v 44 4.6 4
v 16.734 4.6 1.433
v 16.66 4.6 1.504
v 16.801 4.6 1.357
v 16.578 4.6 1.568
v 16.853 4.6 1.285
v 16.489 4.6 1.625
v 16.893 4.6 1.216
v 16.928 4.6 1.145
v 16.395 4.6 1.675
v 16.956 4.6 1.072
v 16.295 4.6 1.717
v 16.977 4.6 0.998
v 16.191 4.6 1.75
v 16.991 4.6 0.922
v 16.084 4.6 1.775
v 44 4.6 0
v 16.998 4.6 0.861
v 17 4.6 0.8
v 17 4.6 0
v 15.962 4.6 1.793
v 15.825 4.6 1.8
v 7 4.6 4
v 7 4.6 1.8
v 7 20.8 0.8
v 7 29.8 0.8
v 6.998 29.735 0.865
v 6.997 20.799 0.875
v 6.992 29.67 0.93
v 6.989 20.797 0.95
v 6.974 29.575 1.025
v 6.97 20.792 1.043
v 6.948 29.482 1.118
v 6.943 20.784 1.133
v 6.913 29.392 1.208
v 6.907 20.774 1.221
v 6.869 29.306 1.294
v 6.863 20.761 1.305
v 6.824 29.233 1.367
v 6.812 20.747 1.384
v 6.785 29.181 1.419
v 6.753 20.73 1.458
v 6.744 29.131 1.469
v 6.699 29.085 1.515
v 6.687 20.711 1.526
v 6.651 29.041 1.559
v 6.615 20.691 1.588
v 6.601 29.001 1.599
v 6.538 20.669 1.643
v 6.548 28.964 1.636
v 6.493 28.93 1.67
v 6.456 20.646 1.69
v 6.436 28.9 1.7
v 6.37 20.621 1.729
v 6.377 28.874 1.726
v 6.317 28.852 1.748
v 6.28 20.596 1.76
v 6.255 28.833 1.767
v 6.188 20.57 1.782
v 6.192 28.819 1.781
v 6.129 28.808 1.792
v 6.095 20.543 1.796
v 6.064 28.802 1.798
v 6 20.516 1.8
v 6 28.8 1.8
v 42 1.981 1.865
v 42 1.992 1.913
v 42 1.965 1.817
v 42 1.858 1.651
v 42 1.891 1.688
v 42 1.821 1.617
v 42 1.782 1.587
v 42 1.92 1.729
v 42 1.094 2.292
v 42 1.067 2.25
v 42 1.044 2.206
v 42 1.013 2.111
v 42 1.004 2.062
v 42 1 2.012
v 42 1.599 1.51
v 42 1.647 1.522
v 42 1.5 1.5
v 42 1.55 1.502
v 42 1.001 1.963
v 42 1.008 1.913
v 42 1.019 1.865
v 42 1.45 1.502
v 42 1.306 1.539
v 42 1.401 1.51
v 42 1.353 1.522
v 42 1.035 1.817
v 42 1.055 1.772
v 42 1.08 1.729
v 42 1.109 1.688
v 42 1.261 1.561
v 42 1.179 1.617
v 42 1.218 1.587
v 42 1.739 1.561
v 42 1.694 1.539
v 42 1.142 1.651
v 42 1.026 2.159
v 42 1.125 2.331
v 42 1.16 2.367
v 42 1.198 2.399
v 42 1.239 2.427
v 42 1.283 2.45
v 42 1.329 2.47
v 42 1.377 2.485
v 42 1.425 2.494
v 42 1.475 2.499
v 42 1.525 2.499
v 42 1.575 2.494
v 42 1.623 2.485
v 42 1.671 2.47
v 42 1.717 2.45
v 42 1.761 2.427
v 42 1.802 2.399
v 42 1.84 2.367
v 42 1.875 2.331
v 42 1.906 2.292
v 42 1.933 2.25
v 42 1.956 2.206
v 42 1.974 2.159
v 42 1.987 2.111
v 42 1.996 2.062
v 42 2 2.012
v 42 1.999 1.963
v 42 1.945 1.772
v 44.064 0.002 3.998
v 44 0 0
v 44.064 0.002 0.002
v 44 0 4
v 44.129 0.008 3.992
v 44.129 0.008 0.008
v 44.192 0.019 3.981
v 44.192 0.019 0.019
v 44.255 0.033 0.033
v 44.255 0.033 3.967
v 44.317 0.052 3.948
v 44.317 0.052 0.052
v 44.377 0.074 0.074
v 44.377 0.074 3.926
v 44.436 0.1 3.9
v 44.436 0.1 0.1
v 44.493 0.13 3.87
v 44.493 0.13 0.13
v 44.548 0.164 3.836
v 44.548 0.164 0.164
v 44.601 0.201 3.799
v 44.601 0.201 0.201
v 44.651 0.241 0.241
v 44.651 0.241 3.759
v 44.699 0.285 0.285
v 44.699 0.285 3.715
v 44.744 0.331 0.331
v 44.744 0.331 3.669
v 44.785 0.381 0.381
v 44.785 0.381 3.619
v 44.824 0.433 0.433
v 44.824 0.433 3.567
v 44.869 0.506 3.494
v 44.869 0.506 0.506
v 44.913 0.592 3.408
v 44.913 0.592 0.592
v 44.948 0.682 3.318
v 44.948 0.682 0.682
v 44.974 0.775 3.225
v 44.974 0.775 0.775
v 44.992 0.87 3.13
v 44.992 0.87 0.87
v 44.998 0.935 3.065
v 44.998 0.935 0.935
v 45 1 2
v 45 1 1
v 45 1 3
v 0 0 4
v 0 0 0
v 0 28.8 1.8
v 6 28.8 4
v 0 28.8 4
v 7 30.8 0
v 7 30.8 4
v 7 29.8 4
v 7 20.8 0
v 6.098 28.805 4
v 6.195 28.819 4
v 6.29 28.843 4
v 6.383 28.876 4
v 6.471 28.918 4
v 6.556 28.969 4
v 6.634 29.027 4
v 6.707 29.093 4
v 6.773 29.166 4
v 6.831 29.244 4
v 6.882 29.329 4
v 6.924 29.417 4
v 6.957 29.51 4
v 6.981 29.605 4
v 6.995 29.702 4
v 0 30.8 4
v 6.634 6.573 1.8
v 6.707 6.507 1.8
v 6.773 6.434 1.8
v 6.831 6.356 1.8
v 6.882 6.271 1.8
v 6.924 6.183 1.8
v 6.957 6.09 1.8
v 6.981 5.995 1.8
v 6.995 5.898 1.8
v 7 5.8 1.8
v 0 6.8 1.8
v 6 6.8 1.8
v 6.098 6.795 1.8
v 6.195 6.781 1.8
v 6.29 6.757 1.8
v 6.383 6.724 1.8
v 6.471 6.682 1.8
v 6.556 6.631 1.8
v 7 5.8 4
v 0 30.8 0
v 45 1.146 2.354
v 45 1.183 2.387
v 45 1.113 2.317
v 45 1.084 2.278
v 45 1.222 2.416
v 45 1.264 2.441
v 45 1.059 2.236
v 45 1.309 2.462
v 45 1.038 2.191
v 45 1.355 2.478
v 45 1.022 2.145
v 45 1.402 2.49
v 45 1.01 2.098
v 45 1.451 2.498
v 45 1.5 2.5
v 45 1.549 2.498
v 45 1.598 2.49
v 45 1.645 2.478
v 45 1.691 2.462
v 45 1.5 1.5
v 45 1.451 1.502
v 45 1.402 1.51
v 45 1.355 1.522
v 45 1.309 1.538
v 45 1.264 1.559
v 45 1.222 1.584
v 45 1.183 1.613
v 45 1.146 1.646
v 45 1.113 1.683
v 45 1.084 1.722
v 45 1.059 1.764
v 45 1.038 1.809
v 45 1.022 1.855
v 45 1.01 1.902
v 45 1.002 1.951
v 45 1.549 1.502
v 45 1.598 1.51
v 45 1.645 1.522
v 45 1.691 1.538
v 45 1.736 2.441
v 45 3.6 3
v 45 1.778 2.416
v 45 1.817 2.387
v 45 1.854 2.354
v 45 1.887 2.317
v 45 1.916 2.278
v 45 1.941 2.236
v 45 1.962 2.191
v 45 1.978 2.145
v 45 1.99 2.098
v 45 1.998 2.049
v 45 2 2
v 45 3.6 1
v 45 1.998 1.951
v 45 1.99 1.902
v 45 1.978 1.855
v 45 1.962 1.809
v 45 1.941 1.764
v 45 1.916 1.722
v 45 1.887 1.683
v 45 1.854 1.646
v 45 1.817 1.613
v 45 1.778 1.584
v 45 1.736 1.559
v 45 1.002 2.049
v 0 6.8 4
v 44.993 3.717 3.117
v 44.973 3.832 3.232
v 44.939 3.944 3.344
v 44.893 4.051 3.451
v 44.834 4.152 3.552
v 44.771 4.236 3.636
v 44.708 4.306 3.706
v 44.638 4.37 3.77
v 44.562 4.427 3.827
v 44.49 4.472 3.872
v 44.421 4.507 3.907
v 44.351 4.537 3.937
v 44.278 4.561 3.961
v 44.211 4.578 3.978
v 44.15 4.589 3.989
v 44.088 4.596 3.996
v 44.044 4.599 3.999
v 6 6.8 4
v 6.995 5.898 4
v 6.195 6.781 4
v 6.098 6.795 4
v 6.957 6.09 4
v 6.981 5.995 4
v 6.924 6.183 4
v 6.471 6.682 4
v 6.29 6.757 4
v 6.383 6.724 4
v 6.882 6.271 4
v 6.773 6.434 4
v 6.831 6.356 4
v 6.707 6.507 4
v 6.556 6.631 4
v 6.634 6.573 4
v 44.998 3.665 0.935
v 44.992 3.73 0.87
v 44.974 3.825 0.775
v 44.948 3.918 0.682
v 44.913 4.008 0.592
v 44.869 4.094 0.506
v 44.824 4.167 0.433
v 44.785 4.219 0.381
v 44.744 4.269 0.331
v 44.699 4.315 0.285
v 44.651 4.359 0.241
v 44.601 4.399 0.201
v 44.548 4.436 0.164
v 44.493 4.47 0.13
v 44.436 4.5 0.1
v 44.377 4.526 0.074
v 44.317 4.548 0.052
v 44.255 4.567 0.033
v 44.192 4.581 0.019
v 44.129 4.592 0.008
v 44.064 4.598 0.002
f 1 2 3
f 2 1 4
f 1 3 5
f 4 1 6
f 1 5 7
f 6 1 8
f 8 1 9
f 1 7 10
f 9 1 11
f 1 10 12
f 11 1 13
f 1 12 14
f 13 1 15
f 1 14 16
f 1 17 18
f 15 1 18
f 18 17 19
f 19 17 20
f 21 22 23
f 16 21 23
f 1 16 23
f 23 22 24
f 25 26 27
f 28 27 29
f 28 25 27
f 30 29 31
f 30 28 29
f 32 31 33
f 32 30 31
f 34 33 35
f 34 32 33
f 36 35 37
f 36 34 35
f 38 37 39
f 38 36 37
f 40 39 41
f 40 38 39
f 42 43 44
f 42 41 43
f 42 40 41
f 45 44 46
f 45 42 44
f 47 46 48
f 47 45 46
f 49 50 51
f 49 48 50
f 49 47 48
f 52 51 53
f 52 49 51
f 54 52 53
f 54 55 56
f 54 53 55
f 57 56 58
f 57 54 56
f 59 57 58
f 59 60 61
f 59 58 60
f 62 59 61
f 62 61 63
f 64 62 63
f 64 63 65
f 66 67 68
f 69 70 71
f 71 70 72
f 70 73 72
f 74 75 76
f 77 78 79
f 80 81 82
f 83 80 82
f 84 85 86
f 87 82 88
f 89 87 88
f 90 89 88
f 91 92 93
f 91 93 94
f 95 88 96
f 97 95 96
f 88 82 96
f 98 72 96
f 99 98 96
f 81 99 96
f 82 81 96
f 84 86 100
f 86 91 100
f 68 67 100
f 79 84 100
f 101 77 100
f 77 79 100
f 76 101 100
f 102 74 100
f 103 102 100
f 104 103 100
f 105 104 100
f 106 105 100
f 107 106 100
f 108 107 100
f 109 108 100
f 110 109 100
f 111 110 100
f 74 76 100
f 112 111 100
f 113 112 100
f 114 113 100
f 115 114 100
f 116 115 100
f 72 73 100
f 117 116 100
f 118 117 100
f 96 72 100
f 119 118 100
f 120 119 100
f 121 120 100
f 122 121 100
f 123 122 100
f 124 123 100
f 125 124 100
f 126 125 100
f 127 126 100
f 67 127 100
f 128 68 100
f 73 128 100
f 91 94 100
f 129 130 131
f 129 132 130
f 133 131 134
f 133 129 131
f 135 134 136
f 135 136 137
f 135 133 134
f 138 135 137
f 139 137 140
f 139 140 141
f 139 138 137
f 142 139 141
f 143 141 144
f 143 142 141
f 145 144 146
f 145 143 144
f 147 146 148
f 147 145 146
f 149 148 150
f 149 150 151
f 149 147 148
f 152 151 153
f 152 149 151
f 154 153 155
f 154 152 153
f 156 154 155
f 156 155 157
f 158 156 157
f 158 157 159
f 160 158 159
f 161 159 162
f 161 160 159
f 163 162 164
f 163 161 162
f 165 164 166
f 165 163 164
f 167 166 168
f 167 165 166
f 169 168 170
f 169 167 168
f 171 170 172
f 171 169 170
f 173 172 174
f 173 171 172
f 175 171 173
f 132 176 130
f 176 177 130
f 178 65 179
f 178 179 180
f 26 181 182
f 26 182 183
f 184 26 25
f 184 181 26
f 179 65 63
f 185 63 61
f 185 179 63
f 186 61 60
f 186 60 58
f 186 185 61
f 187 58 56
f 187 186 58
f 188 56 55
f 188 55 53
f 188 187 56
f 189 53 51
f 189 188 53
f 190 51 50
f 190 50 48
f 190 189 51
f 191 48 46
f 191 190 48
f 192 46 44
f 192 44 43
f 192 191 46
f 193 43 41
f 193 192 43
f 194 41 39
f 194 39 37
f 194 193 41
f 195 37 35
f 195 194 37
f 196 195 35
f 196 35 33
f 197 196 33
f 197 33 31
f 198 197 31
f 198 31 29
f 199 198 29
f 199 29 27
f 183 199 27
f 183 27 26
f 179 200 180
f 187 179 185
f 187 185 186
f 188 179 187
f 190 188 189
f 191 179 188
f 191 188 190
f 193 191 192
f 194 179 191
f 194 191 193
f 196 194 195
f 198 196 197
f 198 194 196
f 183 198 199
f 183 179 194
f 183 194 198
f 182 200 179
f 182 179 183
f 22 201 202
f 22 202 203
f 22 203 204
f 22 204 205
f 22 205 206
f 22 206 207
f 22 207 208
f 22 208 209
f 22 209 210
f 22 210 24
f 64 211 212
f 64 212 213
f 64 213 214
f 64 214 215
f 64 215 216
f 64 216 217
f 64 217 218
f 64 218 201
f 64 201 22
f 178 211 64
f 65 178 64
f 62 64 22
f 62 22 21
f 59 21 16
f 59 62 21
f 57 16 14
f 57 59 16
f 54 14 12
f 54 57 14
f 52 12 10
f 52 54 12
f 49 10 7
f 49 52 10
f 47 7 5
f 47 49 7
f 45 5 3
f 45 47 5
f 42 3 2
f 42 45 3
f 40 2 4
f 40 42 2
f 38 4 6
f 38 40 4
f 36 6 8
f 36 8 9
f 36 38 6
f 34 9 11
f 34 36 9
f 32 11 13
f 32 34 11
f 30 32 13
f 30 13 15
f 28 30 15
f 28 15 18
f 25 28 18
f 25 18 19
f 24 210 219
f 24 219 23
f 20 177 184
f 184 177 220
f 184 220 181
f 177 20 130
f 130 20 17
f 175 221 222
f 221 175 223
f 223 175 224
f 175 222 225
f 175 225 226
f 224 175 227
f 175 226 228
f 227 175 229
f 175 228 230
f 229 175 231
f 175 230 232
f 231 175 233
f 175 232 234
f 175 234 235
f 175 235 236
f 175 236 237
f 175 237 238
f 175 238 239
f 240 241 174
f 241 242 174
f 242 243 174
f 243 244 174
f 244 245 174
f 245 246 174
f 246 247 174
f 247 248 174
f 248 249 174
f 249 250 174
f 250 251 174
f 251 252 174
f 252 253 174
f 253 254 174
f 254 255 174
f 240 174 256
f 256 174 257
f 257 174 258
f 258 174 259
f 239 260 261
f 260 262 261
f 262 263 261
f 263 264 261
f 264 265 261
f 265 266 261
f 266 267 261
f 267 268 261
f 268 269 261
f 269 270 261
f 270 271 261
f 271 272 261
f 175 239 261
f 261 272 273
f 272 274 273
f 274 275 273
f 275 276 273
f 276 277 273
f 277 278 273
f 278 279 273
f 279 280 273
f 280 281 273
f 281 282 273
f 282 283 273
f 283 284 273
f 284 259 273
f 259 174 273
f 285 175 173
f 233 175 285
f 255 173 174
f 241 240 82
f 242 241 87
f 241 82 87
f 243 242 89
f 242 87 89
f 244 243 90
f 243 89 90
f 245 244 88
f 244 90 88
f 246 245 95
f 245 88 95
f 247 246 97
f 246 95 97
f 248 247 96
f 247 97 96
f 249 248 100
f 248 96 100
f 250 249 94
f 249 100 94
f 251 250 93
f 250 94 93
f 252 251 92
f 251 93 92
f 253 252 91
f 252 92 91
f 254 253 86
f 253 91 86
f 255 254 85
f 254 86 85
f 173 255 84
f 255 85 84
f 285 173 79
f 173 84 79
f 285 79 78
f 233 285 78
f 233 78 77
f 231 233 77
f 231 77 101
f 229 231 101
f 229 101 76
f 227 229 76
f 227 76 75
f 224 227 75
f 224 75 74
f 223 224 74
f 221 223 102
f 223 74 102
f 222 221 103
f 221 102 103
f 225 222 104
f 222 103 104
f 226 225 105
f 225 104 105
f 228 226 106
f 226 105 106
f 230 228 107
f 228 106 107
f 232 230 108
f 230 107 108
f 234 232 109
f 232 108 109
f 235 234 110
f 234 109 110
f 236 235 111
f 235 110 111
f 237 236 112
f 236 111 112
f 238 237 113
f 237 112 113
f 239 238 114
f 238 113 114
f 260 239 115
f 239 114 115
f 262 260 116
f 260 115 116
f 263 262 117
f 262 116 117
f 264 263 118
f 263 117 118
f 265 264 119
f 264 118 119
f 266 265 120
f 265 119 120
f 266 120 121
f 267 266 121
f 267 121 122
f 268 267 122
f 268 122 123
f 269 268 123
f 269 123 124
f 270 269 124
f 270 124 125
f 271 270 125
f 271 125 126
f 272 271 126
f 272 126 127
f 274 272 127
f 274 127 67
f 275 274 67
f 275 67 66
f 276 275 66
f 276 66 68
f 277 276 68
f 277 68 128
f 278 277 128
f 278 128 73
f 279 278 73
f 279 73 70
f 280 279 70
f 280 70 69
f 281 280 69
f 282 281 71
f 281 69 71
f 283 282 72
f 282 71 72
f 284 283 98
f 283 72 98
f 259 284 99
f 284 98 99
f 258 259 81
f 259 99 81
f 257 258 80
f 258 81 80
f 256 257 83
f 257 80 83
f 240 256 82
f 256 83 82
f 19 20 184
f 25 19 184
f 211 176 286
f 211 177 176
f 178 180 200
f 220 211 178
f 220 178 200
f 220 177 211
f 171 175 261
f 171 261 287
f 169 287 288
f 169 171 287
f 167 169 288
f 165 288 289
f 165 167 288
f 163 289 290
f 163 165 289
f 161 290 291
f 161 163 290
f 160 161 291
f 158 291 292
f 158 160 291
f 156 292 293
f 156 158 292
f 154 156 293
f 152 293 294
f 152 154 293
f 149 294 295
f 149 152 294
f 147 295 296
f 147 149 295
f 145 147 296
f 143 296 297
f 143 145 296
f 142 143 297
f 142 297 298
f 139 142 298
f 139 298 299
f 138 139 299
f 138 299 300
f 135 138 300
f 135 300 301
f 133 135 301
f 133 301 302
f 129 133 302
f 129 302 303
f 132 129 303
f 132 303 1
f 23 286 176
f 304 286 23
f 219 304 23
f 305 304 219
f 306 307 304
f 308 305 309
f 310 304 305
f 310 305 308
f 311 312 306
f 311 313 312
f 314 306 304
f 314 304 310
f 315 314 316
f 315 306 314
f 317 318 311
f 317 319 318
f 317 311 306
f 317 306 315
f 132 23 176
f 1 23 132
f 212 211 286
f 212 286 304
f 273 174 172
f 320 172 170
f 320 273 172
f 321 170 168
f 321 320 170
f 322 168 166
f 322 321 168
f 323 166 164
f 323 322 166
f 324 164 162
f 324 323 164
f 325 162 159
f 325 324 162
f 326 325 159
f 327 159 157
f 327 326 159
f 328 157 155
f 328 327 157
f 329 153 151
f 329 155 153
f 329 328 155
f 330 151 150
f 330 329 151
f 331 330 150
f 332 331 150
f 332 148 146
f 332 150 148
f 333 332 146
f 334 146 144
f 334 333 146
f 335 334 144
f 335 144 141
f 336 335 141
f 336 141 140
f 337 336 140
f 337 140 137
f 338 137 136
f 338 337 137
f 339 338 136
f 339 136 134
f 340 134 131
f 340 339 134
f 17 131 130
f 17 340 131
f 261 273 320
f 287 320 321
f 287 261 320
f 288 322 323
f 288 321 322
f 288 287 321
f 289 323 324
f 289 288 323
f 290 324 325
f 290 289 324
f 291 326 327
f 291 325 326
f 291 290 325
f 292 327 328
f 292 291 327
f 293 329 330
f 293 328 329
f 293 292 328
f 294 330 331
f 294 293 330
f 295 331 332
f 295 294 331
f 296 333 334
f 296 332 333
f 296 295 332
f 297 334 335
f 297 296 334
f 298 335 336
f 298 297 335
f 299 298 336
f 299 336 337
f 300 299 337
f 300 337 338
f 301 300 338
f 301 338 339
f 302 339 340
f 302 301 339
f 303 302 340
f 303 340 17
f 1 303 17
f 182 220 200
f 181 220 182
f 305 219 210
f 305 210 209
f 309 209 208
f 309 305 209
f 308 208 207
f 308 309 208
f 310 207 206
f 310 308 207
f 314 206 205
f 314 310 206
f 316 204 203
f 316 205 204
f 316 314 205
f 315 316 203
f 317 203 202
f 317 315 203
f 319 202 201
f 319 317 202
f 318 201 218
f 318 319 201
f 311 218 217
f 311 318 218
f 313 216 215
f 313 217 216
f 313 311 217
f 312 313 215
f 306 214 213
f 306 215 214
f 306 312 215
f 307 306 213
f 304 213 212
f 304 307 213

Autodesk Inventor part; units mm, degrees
ref_plane "YZ Plane" through (0, 0, 0) normal (1, 0, 0) x (0, 1, 0)
ref_plane "XZ Plane" through (0, 0, 0) normal (0, 1, 0) x (-1, 0, 0)
ref_plane "XY Plane" through (0, 0, 0) normal (0, 0, 1) x (1, 0, 0)
sketch "Boceto1" plane through (0, 0, 0) normal (0, 0, 1) x (1, 0, 0)
  line L0 (0, 0) -> (0, 30.8)
  line L1 (0, 30.8) -> (7, 30.8)
  line L2 (7, 30.8) -> (7, 20.8)
  line L3 (0, 0) -> (45, 0)
  line L4 (45, 0) -> (45, 4.6)
  line L5 (45, 4.6) -> (17, 4.6)
  line L6 (17, 4.6) -> (7, 20.8)
  dimension "d0" = 30.8
  dimension "d1" = 7
  dimension "d2" = 10
  dimension "d3" = 45
  dimension "d4" = 4.6
  dimension "d5" = 28
extrude "Extrusión1" add sketch "Boceto1" along normal blind 1.8
sketch "Boceto2" plane through (0, 0, 1.8) normal (0, 0, 1) x (1, 0, 0)
  line L0 (0, 0) -> (0, 30.8) projected
  line L1 (45, 0) -> (0, 0) projected
  line L2 (45, 4.6) -> (45, 0) projected
  line L3 (17, 4.6) -> (45, 4.6) projected
  line L4 (7, 30.8) -> (7, 20.8) projected
  line L5 (17, 4.6) -> (7, 4.6)
  line L6 (0, 6.8) -> (7, 6.8)
  line L7 (7, 6.8) -> (7, 4.6)
  line L8 (0, 30.8) -> (7, 30.8)
  line L9 (7, 30.8) -> (7, 28.8)
  line L10 (7, 28.8) -> (0, 28.8)
  line L11 (0, 28.8) -> (0, 30.8)
  dimension "d8" = 10
  dimension "d14" = 6.8
  dimension "d18" = 2
extrude "Extrusión2" add sketch "Boceto2" along normal blind 2.2
fillet "Empalme1" radius 1 4 edges at (45, 0, 2) (45, 2.3, 0) (45, 4.6, 2) (45, 2.3, 4)
fillet "Empalme2" radius 1 4 edges at (7, 6.8, 2.9) (7, 28.8, 2.9) (12, 12.7, 1.8) (7, 24.8, 1.8)
sketch "Boceto3" plane through (45, 1, 3) normal (1, 0, 0) x (0, 0, -1)
  line L0 (2, 0) -> (0, 0) projected
  line L1 (2, 2.6) -> (2, 0) projected
  point P0 (3, -1)
  point P1 (1, 0.5)
  dimension "d20" = 0.5
  dimension "d21" = 1
hole "Hole1" at (45, 1.5, 2) direction (-1, 0, 0) diameter 1 depth 3
equation "\"Radio_pliegue\" = Grosor"
equation "\"Anchura_desahogo_plegado\" = Grosor"
equation "\"Profundidad_desahogo_plegado\" = 0.5 * Grosor"
equation "\"Tamaño_destalonado\" = 4 * Grosor"
equation "\"Remanente_mínimo\" = 2 * Grosor"
equation "\"Radiodetransición\" = Radio_pliegue"
equation "\"Tamaño_de_radio_de_Jacobi\" = Radio_pliegue"
equation "\"TamañoSeparación\" = Grosor"
equation "\"Grosor\" = 0.5"
properties part number "Tirador" material "Por defecto"
